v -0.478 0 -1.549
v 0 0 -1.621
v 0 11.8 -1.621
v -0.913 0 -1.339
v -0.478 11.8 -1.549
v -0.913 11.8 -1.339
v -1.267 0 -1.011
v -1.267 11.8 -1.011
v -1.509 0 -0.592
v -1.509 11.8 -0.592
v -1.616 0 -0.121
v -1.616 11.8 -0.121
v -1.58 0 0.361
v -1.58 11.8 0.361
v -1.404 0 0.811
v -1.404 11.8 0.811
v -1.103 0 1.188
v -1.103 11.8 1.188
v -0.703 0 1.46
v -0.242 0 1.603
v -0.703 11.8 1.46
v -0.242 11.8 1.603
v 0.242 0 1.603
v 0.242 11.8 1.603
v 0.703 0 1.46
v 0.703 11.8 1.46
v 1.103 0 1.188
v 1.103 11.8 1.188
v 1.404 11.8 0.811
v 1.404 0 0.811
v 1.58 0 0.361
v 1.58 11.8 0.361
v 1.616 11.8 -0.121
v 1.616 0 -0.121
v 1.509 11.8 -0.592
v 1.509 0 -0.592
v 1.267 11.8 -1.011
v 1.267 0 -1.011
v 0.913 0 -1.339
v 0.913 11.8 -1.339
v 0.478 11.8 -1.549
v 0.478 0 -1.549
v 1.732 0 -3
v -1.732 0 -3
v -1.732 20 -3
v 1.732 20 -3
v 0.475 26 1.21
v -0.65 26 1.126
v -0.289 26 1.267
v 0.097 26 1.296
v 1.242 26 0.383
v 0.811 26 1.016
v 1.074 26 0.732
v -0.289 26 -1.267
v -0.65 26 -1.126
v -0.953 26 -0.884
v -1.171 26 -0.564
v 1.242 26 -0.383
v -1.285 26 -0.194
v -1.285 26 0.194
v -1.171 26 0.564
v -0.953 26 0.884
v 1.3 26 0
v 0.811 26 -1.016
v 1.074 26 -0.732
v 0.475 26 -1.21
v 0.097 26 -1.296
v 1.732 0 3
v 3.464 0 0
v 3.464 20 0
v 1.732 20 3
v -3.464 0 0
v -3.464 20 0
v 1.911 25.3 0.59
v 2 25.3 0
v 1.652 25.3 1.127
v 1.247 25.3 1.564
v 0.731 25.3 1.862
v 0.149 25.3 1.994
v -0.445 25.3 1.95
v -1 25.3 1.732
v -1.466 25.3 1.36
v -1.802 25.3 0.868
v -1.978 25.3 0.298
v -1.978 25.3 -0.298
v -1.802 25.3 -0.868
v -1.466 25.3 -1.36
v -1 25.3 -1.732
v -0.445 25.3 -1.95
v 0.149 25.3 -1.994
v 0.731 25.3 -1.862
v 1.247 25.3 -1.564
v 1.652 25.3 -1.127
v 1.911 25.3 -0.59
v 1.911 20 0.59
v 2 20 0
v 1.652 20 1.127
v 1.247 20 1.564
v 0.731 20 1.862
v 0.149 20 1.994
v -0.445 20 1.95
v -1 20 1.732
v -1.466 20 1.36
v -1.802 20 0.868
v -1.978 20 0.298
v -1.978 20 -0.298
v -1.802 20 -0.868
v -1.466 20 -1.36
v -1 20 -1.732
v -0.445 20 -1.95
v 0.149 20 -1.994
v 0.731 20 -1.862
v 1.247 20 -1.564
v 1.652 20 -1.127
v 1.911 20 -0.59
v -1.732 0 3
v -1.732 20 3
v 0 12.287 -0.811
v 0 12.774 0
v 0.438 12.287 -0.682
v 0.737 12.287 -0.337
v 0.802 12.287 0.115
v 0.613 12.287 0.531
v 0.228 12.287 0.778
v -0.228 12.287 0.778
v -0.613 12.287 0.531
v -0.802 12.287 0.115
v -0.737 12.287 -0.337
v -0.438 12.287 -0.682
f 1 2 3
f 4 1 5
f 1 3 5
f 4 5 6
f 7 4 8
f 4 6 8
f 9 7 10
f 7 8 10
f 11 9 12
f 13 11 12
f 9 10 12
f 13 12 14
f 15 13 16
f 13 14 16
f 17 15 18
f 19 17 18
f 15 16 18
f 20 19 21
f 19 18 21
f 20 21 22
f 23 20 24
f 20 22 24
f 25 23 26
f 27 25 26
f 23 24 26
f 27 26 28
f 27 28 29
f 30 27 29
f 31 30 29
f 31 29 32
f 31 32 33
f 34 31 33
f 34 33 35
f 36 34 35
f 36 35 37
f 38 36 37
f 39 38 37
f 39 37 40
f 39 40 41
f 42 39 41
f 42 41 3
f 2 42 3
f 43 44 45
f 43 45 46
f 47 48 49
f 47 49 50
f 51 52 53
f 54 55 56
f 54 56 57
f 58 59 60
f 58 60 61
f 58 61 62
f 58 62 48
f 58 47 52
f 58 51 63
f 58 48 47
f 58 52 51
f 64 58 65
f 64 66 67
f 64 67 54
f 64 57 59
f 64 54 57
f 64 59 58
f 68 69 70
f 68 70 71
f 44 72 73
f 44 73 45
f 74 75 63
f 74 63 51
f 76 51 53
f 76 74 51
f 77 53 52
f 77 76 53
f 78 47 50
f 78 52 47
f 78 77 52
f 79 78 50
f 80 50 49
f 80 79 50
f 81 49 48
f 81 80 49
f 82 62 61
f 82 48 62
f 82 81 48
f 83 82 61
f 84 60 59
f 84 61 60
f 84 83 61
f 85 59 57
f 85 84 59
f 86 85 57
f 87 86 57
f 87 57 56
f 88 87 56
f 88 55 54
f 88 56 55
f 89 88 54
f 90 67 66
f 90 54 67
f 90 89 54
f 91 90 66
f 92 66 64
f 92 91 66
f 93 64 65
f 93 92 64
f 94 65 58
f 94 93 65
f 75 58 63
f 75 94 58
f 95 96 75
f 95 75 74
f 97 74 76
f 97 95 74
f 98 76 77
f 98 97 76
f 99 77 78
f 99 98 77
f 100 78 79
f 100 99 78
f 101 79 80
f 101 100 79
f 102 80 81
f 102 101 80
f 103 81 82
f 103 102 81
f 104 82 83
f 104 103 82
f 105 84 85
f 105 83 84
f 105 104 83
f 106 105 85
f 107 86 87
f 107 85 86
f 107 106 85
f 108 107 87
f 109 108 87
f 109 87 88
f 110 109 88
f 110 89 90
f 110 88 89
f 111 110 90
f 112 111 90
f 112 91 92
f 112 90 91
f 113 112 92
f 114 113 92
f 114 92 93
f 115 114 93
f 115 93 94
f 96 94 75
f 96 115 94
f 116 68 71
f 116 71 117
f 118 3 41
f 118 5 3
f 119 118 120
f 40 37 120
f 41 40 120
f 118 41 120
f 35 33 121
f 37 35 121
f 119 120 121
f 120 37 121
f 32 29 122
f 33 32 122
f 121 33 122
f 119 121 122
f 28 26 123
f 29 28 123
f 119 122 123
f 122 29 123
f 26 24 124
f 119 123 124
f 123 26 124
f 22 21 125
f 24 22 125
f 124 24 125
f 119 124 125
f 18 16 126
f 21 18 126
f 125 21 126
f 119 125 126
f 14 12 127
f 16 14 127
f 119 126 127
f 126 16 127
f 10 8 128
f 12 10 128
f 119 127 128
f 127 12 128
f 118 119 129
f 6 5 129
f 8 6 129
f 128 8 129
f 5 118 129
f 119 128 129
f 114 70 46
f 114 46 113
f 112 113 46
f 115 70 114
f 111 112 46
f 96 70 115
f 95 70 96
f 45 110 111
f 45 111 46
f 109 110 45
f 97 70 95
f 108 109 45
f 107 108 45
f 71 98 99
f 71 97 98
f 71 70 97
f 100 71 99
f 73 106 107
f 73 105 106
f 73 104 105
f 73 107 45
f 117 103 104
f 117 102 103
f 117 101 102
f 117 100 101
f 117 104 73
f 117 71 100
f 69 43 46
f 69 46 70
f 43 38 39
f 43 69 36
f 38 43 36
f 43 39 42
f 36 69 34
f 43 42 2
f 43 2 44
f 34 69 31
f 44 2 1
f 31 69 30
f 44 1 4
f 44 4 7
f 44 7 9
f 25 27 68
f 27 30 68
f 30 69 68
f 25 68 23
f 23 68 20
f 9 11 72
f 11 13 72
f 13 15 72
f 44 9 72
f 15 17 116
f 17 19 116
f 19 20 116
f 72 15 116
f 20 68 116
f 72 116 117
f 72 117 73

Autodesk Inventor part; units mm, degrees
ref_plane "YZ Plane" through (0, 0, 0) normal (1, 0, 0) x (0, 1, 0)
ref_plane "XZ Plane" through (0, 0, 0) normal (0, 1, 0) x (-1, 0, 0)
ref_plane "XY Plane" through (0, 0, 0) normal (0, 0, 1) x (1, 0, 0)
sketch "Sketch1" plane through (0, 0, 0) normal (0, 1, 0) x (-1, 0, 0)
  line L0 (-1.7321, -3) -> (-3.4641, 0)
  line L1 (-3.4641, 0) -> (-1.7321, 3)
  line L2 (-1.7321, 3) -> (1.7321, 3)
  line L3 (1.7321, 3) -> (3.4641, 0)
  line L4 (3.4641, 0) -> (1.7321, -3)
  line L5 (1.7321, -3) -> (-1.7321, -3)
  point P0 (0, 0)
  point P1 (0, 0)
  point P2 (0, 0)
  dimension "d0" = 3
extrude "Extrusion1" add sketch "Sketch1" along normal blind 20
hole "Hole2" at (0, 0, 0) direction (0, 1, 0) diameter 3.242 depth 11.8 tip angle 118 thread size "M4x0.7" class "6H" standard "ISO Metric profile"
sketch "Sketch3" plane through (0, 20, 0) normal (0, 1, 0) x (1, 0, 0)
  circle A0 centre (0, 0) radius 2
  dimension "d17" = 4
extrude "Extrusion2" add sketch "Sketch3" along normal blind 6
thread "Thread1" size "M4x0.7" class "6g" standard "ANSI Metric M Profile" length 5
chamfer "Chamfer1" distance 0.7 angle 45 1 edges at (-2, 26, 0)
properties part number "StandoffM4x20B" material "Brass, Soft Yellow"
